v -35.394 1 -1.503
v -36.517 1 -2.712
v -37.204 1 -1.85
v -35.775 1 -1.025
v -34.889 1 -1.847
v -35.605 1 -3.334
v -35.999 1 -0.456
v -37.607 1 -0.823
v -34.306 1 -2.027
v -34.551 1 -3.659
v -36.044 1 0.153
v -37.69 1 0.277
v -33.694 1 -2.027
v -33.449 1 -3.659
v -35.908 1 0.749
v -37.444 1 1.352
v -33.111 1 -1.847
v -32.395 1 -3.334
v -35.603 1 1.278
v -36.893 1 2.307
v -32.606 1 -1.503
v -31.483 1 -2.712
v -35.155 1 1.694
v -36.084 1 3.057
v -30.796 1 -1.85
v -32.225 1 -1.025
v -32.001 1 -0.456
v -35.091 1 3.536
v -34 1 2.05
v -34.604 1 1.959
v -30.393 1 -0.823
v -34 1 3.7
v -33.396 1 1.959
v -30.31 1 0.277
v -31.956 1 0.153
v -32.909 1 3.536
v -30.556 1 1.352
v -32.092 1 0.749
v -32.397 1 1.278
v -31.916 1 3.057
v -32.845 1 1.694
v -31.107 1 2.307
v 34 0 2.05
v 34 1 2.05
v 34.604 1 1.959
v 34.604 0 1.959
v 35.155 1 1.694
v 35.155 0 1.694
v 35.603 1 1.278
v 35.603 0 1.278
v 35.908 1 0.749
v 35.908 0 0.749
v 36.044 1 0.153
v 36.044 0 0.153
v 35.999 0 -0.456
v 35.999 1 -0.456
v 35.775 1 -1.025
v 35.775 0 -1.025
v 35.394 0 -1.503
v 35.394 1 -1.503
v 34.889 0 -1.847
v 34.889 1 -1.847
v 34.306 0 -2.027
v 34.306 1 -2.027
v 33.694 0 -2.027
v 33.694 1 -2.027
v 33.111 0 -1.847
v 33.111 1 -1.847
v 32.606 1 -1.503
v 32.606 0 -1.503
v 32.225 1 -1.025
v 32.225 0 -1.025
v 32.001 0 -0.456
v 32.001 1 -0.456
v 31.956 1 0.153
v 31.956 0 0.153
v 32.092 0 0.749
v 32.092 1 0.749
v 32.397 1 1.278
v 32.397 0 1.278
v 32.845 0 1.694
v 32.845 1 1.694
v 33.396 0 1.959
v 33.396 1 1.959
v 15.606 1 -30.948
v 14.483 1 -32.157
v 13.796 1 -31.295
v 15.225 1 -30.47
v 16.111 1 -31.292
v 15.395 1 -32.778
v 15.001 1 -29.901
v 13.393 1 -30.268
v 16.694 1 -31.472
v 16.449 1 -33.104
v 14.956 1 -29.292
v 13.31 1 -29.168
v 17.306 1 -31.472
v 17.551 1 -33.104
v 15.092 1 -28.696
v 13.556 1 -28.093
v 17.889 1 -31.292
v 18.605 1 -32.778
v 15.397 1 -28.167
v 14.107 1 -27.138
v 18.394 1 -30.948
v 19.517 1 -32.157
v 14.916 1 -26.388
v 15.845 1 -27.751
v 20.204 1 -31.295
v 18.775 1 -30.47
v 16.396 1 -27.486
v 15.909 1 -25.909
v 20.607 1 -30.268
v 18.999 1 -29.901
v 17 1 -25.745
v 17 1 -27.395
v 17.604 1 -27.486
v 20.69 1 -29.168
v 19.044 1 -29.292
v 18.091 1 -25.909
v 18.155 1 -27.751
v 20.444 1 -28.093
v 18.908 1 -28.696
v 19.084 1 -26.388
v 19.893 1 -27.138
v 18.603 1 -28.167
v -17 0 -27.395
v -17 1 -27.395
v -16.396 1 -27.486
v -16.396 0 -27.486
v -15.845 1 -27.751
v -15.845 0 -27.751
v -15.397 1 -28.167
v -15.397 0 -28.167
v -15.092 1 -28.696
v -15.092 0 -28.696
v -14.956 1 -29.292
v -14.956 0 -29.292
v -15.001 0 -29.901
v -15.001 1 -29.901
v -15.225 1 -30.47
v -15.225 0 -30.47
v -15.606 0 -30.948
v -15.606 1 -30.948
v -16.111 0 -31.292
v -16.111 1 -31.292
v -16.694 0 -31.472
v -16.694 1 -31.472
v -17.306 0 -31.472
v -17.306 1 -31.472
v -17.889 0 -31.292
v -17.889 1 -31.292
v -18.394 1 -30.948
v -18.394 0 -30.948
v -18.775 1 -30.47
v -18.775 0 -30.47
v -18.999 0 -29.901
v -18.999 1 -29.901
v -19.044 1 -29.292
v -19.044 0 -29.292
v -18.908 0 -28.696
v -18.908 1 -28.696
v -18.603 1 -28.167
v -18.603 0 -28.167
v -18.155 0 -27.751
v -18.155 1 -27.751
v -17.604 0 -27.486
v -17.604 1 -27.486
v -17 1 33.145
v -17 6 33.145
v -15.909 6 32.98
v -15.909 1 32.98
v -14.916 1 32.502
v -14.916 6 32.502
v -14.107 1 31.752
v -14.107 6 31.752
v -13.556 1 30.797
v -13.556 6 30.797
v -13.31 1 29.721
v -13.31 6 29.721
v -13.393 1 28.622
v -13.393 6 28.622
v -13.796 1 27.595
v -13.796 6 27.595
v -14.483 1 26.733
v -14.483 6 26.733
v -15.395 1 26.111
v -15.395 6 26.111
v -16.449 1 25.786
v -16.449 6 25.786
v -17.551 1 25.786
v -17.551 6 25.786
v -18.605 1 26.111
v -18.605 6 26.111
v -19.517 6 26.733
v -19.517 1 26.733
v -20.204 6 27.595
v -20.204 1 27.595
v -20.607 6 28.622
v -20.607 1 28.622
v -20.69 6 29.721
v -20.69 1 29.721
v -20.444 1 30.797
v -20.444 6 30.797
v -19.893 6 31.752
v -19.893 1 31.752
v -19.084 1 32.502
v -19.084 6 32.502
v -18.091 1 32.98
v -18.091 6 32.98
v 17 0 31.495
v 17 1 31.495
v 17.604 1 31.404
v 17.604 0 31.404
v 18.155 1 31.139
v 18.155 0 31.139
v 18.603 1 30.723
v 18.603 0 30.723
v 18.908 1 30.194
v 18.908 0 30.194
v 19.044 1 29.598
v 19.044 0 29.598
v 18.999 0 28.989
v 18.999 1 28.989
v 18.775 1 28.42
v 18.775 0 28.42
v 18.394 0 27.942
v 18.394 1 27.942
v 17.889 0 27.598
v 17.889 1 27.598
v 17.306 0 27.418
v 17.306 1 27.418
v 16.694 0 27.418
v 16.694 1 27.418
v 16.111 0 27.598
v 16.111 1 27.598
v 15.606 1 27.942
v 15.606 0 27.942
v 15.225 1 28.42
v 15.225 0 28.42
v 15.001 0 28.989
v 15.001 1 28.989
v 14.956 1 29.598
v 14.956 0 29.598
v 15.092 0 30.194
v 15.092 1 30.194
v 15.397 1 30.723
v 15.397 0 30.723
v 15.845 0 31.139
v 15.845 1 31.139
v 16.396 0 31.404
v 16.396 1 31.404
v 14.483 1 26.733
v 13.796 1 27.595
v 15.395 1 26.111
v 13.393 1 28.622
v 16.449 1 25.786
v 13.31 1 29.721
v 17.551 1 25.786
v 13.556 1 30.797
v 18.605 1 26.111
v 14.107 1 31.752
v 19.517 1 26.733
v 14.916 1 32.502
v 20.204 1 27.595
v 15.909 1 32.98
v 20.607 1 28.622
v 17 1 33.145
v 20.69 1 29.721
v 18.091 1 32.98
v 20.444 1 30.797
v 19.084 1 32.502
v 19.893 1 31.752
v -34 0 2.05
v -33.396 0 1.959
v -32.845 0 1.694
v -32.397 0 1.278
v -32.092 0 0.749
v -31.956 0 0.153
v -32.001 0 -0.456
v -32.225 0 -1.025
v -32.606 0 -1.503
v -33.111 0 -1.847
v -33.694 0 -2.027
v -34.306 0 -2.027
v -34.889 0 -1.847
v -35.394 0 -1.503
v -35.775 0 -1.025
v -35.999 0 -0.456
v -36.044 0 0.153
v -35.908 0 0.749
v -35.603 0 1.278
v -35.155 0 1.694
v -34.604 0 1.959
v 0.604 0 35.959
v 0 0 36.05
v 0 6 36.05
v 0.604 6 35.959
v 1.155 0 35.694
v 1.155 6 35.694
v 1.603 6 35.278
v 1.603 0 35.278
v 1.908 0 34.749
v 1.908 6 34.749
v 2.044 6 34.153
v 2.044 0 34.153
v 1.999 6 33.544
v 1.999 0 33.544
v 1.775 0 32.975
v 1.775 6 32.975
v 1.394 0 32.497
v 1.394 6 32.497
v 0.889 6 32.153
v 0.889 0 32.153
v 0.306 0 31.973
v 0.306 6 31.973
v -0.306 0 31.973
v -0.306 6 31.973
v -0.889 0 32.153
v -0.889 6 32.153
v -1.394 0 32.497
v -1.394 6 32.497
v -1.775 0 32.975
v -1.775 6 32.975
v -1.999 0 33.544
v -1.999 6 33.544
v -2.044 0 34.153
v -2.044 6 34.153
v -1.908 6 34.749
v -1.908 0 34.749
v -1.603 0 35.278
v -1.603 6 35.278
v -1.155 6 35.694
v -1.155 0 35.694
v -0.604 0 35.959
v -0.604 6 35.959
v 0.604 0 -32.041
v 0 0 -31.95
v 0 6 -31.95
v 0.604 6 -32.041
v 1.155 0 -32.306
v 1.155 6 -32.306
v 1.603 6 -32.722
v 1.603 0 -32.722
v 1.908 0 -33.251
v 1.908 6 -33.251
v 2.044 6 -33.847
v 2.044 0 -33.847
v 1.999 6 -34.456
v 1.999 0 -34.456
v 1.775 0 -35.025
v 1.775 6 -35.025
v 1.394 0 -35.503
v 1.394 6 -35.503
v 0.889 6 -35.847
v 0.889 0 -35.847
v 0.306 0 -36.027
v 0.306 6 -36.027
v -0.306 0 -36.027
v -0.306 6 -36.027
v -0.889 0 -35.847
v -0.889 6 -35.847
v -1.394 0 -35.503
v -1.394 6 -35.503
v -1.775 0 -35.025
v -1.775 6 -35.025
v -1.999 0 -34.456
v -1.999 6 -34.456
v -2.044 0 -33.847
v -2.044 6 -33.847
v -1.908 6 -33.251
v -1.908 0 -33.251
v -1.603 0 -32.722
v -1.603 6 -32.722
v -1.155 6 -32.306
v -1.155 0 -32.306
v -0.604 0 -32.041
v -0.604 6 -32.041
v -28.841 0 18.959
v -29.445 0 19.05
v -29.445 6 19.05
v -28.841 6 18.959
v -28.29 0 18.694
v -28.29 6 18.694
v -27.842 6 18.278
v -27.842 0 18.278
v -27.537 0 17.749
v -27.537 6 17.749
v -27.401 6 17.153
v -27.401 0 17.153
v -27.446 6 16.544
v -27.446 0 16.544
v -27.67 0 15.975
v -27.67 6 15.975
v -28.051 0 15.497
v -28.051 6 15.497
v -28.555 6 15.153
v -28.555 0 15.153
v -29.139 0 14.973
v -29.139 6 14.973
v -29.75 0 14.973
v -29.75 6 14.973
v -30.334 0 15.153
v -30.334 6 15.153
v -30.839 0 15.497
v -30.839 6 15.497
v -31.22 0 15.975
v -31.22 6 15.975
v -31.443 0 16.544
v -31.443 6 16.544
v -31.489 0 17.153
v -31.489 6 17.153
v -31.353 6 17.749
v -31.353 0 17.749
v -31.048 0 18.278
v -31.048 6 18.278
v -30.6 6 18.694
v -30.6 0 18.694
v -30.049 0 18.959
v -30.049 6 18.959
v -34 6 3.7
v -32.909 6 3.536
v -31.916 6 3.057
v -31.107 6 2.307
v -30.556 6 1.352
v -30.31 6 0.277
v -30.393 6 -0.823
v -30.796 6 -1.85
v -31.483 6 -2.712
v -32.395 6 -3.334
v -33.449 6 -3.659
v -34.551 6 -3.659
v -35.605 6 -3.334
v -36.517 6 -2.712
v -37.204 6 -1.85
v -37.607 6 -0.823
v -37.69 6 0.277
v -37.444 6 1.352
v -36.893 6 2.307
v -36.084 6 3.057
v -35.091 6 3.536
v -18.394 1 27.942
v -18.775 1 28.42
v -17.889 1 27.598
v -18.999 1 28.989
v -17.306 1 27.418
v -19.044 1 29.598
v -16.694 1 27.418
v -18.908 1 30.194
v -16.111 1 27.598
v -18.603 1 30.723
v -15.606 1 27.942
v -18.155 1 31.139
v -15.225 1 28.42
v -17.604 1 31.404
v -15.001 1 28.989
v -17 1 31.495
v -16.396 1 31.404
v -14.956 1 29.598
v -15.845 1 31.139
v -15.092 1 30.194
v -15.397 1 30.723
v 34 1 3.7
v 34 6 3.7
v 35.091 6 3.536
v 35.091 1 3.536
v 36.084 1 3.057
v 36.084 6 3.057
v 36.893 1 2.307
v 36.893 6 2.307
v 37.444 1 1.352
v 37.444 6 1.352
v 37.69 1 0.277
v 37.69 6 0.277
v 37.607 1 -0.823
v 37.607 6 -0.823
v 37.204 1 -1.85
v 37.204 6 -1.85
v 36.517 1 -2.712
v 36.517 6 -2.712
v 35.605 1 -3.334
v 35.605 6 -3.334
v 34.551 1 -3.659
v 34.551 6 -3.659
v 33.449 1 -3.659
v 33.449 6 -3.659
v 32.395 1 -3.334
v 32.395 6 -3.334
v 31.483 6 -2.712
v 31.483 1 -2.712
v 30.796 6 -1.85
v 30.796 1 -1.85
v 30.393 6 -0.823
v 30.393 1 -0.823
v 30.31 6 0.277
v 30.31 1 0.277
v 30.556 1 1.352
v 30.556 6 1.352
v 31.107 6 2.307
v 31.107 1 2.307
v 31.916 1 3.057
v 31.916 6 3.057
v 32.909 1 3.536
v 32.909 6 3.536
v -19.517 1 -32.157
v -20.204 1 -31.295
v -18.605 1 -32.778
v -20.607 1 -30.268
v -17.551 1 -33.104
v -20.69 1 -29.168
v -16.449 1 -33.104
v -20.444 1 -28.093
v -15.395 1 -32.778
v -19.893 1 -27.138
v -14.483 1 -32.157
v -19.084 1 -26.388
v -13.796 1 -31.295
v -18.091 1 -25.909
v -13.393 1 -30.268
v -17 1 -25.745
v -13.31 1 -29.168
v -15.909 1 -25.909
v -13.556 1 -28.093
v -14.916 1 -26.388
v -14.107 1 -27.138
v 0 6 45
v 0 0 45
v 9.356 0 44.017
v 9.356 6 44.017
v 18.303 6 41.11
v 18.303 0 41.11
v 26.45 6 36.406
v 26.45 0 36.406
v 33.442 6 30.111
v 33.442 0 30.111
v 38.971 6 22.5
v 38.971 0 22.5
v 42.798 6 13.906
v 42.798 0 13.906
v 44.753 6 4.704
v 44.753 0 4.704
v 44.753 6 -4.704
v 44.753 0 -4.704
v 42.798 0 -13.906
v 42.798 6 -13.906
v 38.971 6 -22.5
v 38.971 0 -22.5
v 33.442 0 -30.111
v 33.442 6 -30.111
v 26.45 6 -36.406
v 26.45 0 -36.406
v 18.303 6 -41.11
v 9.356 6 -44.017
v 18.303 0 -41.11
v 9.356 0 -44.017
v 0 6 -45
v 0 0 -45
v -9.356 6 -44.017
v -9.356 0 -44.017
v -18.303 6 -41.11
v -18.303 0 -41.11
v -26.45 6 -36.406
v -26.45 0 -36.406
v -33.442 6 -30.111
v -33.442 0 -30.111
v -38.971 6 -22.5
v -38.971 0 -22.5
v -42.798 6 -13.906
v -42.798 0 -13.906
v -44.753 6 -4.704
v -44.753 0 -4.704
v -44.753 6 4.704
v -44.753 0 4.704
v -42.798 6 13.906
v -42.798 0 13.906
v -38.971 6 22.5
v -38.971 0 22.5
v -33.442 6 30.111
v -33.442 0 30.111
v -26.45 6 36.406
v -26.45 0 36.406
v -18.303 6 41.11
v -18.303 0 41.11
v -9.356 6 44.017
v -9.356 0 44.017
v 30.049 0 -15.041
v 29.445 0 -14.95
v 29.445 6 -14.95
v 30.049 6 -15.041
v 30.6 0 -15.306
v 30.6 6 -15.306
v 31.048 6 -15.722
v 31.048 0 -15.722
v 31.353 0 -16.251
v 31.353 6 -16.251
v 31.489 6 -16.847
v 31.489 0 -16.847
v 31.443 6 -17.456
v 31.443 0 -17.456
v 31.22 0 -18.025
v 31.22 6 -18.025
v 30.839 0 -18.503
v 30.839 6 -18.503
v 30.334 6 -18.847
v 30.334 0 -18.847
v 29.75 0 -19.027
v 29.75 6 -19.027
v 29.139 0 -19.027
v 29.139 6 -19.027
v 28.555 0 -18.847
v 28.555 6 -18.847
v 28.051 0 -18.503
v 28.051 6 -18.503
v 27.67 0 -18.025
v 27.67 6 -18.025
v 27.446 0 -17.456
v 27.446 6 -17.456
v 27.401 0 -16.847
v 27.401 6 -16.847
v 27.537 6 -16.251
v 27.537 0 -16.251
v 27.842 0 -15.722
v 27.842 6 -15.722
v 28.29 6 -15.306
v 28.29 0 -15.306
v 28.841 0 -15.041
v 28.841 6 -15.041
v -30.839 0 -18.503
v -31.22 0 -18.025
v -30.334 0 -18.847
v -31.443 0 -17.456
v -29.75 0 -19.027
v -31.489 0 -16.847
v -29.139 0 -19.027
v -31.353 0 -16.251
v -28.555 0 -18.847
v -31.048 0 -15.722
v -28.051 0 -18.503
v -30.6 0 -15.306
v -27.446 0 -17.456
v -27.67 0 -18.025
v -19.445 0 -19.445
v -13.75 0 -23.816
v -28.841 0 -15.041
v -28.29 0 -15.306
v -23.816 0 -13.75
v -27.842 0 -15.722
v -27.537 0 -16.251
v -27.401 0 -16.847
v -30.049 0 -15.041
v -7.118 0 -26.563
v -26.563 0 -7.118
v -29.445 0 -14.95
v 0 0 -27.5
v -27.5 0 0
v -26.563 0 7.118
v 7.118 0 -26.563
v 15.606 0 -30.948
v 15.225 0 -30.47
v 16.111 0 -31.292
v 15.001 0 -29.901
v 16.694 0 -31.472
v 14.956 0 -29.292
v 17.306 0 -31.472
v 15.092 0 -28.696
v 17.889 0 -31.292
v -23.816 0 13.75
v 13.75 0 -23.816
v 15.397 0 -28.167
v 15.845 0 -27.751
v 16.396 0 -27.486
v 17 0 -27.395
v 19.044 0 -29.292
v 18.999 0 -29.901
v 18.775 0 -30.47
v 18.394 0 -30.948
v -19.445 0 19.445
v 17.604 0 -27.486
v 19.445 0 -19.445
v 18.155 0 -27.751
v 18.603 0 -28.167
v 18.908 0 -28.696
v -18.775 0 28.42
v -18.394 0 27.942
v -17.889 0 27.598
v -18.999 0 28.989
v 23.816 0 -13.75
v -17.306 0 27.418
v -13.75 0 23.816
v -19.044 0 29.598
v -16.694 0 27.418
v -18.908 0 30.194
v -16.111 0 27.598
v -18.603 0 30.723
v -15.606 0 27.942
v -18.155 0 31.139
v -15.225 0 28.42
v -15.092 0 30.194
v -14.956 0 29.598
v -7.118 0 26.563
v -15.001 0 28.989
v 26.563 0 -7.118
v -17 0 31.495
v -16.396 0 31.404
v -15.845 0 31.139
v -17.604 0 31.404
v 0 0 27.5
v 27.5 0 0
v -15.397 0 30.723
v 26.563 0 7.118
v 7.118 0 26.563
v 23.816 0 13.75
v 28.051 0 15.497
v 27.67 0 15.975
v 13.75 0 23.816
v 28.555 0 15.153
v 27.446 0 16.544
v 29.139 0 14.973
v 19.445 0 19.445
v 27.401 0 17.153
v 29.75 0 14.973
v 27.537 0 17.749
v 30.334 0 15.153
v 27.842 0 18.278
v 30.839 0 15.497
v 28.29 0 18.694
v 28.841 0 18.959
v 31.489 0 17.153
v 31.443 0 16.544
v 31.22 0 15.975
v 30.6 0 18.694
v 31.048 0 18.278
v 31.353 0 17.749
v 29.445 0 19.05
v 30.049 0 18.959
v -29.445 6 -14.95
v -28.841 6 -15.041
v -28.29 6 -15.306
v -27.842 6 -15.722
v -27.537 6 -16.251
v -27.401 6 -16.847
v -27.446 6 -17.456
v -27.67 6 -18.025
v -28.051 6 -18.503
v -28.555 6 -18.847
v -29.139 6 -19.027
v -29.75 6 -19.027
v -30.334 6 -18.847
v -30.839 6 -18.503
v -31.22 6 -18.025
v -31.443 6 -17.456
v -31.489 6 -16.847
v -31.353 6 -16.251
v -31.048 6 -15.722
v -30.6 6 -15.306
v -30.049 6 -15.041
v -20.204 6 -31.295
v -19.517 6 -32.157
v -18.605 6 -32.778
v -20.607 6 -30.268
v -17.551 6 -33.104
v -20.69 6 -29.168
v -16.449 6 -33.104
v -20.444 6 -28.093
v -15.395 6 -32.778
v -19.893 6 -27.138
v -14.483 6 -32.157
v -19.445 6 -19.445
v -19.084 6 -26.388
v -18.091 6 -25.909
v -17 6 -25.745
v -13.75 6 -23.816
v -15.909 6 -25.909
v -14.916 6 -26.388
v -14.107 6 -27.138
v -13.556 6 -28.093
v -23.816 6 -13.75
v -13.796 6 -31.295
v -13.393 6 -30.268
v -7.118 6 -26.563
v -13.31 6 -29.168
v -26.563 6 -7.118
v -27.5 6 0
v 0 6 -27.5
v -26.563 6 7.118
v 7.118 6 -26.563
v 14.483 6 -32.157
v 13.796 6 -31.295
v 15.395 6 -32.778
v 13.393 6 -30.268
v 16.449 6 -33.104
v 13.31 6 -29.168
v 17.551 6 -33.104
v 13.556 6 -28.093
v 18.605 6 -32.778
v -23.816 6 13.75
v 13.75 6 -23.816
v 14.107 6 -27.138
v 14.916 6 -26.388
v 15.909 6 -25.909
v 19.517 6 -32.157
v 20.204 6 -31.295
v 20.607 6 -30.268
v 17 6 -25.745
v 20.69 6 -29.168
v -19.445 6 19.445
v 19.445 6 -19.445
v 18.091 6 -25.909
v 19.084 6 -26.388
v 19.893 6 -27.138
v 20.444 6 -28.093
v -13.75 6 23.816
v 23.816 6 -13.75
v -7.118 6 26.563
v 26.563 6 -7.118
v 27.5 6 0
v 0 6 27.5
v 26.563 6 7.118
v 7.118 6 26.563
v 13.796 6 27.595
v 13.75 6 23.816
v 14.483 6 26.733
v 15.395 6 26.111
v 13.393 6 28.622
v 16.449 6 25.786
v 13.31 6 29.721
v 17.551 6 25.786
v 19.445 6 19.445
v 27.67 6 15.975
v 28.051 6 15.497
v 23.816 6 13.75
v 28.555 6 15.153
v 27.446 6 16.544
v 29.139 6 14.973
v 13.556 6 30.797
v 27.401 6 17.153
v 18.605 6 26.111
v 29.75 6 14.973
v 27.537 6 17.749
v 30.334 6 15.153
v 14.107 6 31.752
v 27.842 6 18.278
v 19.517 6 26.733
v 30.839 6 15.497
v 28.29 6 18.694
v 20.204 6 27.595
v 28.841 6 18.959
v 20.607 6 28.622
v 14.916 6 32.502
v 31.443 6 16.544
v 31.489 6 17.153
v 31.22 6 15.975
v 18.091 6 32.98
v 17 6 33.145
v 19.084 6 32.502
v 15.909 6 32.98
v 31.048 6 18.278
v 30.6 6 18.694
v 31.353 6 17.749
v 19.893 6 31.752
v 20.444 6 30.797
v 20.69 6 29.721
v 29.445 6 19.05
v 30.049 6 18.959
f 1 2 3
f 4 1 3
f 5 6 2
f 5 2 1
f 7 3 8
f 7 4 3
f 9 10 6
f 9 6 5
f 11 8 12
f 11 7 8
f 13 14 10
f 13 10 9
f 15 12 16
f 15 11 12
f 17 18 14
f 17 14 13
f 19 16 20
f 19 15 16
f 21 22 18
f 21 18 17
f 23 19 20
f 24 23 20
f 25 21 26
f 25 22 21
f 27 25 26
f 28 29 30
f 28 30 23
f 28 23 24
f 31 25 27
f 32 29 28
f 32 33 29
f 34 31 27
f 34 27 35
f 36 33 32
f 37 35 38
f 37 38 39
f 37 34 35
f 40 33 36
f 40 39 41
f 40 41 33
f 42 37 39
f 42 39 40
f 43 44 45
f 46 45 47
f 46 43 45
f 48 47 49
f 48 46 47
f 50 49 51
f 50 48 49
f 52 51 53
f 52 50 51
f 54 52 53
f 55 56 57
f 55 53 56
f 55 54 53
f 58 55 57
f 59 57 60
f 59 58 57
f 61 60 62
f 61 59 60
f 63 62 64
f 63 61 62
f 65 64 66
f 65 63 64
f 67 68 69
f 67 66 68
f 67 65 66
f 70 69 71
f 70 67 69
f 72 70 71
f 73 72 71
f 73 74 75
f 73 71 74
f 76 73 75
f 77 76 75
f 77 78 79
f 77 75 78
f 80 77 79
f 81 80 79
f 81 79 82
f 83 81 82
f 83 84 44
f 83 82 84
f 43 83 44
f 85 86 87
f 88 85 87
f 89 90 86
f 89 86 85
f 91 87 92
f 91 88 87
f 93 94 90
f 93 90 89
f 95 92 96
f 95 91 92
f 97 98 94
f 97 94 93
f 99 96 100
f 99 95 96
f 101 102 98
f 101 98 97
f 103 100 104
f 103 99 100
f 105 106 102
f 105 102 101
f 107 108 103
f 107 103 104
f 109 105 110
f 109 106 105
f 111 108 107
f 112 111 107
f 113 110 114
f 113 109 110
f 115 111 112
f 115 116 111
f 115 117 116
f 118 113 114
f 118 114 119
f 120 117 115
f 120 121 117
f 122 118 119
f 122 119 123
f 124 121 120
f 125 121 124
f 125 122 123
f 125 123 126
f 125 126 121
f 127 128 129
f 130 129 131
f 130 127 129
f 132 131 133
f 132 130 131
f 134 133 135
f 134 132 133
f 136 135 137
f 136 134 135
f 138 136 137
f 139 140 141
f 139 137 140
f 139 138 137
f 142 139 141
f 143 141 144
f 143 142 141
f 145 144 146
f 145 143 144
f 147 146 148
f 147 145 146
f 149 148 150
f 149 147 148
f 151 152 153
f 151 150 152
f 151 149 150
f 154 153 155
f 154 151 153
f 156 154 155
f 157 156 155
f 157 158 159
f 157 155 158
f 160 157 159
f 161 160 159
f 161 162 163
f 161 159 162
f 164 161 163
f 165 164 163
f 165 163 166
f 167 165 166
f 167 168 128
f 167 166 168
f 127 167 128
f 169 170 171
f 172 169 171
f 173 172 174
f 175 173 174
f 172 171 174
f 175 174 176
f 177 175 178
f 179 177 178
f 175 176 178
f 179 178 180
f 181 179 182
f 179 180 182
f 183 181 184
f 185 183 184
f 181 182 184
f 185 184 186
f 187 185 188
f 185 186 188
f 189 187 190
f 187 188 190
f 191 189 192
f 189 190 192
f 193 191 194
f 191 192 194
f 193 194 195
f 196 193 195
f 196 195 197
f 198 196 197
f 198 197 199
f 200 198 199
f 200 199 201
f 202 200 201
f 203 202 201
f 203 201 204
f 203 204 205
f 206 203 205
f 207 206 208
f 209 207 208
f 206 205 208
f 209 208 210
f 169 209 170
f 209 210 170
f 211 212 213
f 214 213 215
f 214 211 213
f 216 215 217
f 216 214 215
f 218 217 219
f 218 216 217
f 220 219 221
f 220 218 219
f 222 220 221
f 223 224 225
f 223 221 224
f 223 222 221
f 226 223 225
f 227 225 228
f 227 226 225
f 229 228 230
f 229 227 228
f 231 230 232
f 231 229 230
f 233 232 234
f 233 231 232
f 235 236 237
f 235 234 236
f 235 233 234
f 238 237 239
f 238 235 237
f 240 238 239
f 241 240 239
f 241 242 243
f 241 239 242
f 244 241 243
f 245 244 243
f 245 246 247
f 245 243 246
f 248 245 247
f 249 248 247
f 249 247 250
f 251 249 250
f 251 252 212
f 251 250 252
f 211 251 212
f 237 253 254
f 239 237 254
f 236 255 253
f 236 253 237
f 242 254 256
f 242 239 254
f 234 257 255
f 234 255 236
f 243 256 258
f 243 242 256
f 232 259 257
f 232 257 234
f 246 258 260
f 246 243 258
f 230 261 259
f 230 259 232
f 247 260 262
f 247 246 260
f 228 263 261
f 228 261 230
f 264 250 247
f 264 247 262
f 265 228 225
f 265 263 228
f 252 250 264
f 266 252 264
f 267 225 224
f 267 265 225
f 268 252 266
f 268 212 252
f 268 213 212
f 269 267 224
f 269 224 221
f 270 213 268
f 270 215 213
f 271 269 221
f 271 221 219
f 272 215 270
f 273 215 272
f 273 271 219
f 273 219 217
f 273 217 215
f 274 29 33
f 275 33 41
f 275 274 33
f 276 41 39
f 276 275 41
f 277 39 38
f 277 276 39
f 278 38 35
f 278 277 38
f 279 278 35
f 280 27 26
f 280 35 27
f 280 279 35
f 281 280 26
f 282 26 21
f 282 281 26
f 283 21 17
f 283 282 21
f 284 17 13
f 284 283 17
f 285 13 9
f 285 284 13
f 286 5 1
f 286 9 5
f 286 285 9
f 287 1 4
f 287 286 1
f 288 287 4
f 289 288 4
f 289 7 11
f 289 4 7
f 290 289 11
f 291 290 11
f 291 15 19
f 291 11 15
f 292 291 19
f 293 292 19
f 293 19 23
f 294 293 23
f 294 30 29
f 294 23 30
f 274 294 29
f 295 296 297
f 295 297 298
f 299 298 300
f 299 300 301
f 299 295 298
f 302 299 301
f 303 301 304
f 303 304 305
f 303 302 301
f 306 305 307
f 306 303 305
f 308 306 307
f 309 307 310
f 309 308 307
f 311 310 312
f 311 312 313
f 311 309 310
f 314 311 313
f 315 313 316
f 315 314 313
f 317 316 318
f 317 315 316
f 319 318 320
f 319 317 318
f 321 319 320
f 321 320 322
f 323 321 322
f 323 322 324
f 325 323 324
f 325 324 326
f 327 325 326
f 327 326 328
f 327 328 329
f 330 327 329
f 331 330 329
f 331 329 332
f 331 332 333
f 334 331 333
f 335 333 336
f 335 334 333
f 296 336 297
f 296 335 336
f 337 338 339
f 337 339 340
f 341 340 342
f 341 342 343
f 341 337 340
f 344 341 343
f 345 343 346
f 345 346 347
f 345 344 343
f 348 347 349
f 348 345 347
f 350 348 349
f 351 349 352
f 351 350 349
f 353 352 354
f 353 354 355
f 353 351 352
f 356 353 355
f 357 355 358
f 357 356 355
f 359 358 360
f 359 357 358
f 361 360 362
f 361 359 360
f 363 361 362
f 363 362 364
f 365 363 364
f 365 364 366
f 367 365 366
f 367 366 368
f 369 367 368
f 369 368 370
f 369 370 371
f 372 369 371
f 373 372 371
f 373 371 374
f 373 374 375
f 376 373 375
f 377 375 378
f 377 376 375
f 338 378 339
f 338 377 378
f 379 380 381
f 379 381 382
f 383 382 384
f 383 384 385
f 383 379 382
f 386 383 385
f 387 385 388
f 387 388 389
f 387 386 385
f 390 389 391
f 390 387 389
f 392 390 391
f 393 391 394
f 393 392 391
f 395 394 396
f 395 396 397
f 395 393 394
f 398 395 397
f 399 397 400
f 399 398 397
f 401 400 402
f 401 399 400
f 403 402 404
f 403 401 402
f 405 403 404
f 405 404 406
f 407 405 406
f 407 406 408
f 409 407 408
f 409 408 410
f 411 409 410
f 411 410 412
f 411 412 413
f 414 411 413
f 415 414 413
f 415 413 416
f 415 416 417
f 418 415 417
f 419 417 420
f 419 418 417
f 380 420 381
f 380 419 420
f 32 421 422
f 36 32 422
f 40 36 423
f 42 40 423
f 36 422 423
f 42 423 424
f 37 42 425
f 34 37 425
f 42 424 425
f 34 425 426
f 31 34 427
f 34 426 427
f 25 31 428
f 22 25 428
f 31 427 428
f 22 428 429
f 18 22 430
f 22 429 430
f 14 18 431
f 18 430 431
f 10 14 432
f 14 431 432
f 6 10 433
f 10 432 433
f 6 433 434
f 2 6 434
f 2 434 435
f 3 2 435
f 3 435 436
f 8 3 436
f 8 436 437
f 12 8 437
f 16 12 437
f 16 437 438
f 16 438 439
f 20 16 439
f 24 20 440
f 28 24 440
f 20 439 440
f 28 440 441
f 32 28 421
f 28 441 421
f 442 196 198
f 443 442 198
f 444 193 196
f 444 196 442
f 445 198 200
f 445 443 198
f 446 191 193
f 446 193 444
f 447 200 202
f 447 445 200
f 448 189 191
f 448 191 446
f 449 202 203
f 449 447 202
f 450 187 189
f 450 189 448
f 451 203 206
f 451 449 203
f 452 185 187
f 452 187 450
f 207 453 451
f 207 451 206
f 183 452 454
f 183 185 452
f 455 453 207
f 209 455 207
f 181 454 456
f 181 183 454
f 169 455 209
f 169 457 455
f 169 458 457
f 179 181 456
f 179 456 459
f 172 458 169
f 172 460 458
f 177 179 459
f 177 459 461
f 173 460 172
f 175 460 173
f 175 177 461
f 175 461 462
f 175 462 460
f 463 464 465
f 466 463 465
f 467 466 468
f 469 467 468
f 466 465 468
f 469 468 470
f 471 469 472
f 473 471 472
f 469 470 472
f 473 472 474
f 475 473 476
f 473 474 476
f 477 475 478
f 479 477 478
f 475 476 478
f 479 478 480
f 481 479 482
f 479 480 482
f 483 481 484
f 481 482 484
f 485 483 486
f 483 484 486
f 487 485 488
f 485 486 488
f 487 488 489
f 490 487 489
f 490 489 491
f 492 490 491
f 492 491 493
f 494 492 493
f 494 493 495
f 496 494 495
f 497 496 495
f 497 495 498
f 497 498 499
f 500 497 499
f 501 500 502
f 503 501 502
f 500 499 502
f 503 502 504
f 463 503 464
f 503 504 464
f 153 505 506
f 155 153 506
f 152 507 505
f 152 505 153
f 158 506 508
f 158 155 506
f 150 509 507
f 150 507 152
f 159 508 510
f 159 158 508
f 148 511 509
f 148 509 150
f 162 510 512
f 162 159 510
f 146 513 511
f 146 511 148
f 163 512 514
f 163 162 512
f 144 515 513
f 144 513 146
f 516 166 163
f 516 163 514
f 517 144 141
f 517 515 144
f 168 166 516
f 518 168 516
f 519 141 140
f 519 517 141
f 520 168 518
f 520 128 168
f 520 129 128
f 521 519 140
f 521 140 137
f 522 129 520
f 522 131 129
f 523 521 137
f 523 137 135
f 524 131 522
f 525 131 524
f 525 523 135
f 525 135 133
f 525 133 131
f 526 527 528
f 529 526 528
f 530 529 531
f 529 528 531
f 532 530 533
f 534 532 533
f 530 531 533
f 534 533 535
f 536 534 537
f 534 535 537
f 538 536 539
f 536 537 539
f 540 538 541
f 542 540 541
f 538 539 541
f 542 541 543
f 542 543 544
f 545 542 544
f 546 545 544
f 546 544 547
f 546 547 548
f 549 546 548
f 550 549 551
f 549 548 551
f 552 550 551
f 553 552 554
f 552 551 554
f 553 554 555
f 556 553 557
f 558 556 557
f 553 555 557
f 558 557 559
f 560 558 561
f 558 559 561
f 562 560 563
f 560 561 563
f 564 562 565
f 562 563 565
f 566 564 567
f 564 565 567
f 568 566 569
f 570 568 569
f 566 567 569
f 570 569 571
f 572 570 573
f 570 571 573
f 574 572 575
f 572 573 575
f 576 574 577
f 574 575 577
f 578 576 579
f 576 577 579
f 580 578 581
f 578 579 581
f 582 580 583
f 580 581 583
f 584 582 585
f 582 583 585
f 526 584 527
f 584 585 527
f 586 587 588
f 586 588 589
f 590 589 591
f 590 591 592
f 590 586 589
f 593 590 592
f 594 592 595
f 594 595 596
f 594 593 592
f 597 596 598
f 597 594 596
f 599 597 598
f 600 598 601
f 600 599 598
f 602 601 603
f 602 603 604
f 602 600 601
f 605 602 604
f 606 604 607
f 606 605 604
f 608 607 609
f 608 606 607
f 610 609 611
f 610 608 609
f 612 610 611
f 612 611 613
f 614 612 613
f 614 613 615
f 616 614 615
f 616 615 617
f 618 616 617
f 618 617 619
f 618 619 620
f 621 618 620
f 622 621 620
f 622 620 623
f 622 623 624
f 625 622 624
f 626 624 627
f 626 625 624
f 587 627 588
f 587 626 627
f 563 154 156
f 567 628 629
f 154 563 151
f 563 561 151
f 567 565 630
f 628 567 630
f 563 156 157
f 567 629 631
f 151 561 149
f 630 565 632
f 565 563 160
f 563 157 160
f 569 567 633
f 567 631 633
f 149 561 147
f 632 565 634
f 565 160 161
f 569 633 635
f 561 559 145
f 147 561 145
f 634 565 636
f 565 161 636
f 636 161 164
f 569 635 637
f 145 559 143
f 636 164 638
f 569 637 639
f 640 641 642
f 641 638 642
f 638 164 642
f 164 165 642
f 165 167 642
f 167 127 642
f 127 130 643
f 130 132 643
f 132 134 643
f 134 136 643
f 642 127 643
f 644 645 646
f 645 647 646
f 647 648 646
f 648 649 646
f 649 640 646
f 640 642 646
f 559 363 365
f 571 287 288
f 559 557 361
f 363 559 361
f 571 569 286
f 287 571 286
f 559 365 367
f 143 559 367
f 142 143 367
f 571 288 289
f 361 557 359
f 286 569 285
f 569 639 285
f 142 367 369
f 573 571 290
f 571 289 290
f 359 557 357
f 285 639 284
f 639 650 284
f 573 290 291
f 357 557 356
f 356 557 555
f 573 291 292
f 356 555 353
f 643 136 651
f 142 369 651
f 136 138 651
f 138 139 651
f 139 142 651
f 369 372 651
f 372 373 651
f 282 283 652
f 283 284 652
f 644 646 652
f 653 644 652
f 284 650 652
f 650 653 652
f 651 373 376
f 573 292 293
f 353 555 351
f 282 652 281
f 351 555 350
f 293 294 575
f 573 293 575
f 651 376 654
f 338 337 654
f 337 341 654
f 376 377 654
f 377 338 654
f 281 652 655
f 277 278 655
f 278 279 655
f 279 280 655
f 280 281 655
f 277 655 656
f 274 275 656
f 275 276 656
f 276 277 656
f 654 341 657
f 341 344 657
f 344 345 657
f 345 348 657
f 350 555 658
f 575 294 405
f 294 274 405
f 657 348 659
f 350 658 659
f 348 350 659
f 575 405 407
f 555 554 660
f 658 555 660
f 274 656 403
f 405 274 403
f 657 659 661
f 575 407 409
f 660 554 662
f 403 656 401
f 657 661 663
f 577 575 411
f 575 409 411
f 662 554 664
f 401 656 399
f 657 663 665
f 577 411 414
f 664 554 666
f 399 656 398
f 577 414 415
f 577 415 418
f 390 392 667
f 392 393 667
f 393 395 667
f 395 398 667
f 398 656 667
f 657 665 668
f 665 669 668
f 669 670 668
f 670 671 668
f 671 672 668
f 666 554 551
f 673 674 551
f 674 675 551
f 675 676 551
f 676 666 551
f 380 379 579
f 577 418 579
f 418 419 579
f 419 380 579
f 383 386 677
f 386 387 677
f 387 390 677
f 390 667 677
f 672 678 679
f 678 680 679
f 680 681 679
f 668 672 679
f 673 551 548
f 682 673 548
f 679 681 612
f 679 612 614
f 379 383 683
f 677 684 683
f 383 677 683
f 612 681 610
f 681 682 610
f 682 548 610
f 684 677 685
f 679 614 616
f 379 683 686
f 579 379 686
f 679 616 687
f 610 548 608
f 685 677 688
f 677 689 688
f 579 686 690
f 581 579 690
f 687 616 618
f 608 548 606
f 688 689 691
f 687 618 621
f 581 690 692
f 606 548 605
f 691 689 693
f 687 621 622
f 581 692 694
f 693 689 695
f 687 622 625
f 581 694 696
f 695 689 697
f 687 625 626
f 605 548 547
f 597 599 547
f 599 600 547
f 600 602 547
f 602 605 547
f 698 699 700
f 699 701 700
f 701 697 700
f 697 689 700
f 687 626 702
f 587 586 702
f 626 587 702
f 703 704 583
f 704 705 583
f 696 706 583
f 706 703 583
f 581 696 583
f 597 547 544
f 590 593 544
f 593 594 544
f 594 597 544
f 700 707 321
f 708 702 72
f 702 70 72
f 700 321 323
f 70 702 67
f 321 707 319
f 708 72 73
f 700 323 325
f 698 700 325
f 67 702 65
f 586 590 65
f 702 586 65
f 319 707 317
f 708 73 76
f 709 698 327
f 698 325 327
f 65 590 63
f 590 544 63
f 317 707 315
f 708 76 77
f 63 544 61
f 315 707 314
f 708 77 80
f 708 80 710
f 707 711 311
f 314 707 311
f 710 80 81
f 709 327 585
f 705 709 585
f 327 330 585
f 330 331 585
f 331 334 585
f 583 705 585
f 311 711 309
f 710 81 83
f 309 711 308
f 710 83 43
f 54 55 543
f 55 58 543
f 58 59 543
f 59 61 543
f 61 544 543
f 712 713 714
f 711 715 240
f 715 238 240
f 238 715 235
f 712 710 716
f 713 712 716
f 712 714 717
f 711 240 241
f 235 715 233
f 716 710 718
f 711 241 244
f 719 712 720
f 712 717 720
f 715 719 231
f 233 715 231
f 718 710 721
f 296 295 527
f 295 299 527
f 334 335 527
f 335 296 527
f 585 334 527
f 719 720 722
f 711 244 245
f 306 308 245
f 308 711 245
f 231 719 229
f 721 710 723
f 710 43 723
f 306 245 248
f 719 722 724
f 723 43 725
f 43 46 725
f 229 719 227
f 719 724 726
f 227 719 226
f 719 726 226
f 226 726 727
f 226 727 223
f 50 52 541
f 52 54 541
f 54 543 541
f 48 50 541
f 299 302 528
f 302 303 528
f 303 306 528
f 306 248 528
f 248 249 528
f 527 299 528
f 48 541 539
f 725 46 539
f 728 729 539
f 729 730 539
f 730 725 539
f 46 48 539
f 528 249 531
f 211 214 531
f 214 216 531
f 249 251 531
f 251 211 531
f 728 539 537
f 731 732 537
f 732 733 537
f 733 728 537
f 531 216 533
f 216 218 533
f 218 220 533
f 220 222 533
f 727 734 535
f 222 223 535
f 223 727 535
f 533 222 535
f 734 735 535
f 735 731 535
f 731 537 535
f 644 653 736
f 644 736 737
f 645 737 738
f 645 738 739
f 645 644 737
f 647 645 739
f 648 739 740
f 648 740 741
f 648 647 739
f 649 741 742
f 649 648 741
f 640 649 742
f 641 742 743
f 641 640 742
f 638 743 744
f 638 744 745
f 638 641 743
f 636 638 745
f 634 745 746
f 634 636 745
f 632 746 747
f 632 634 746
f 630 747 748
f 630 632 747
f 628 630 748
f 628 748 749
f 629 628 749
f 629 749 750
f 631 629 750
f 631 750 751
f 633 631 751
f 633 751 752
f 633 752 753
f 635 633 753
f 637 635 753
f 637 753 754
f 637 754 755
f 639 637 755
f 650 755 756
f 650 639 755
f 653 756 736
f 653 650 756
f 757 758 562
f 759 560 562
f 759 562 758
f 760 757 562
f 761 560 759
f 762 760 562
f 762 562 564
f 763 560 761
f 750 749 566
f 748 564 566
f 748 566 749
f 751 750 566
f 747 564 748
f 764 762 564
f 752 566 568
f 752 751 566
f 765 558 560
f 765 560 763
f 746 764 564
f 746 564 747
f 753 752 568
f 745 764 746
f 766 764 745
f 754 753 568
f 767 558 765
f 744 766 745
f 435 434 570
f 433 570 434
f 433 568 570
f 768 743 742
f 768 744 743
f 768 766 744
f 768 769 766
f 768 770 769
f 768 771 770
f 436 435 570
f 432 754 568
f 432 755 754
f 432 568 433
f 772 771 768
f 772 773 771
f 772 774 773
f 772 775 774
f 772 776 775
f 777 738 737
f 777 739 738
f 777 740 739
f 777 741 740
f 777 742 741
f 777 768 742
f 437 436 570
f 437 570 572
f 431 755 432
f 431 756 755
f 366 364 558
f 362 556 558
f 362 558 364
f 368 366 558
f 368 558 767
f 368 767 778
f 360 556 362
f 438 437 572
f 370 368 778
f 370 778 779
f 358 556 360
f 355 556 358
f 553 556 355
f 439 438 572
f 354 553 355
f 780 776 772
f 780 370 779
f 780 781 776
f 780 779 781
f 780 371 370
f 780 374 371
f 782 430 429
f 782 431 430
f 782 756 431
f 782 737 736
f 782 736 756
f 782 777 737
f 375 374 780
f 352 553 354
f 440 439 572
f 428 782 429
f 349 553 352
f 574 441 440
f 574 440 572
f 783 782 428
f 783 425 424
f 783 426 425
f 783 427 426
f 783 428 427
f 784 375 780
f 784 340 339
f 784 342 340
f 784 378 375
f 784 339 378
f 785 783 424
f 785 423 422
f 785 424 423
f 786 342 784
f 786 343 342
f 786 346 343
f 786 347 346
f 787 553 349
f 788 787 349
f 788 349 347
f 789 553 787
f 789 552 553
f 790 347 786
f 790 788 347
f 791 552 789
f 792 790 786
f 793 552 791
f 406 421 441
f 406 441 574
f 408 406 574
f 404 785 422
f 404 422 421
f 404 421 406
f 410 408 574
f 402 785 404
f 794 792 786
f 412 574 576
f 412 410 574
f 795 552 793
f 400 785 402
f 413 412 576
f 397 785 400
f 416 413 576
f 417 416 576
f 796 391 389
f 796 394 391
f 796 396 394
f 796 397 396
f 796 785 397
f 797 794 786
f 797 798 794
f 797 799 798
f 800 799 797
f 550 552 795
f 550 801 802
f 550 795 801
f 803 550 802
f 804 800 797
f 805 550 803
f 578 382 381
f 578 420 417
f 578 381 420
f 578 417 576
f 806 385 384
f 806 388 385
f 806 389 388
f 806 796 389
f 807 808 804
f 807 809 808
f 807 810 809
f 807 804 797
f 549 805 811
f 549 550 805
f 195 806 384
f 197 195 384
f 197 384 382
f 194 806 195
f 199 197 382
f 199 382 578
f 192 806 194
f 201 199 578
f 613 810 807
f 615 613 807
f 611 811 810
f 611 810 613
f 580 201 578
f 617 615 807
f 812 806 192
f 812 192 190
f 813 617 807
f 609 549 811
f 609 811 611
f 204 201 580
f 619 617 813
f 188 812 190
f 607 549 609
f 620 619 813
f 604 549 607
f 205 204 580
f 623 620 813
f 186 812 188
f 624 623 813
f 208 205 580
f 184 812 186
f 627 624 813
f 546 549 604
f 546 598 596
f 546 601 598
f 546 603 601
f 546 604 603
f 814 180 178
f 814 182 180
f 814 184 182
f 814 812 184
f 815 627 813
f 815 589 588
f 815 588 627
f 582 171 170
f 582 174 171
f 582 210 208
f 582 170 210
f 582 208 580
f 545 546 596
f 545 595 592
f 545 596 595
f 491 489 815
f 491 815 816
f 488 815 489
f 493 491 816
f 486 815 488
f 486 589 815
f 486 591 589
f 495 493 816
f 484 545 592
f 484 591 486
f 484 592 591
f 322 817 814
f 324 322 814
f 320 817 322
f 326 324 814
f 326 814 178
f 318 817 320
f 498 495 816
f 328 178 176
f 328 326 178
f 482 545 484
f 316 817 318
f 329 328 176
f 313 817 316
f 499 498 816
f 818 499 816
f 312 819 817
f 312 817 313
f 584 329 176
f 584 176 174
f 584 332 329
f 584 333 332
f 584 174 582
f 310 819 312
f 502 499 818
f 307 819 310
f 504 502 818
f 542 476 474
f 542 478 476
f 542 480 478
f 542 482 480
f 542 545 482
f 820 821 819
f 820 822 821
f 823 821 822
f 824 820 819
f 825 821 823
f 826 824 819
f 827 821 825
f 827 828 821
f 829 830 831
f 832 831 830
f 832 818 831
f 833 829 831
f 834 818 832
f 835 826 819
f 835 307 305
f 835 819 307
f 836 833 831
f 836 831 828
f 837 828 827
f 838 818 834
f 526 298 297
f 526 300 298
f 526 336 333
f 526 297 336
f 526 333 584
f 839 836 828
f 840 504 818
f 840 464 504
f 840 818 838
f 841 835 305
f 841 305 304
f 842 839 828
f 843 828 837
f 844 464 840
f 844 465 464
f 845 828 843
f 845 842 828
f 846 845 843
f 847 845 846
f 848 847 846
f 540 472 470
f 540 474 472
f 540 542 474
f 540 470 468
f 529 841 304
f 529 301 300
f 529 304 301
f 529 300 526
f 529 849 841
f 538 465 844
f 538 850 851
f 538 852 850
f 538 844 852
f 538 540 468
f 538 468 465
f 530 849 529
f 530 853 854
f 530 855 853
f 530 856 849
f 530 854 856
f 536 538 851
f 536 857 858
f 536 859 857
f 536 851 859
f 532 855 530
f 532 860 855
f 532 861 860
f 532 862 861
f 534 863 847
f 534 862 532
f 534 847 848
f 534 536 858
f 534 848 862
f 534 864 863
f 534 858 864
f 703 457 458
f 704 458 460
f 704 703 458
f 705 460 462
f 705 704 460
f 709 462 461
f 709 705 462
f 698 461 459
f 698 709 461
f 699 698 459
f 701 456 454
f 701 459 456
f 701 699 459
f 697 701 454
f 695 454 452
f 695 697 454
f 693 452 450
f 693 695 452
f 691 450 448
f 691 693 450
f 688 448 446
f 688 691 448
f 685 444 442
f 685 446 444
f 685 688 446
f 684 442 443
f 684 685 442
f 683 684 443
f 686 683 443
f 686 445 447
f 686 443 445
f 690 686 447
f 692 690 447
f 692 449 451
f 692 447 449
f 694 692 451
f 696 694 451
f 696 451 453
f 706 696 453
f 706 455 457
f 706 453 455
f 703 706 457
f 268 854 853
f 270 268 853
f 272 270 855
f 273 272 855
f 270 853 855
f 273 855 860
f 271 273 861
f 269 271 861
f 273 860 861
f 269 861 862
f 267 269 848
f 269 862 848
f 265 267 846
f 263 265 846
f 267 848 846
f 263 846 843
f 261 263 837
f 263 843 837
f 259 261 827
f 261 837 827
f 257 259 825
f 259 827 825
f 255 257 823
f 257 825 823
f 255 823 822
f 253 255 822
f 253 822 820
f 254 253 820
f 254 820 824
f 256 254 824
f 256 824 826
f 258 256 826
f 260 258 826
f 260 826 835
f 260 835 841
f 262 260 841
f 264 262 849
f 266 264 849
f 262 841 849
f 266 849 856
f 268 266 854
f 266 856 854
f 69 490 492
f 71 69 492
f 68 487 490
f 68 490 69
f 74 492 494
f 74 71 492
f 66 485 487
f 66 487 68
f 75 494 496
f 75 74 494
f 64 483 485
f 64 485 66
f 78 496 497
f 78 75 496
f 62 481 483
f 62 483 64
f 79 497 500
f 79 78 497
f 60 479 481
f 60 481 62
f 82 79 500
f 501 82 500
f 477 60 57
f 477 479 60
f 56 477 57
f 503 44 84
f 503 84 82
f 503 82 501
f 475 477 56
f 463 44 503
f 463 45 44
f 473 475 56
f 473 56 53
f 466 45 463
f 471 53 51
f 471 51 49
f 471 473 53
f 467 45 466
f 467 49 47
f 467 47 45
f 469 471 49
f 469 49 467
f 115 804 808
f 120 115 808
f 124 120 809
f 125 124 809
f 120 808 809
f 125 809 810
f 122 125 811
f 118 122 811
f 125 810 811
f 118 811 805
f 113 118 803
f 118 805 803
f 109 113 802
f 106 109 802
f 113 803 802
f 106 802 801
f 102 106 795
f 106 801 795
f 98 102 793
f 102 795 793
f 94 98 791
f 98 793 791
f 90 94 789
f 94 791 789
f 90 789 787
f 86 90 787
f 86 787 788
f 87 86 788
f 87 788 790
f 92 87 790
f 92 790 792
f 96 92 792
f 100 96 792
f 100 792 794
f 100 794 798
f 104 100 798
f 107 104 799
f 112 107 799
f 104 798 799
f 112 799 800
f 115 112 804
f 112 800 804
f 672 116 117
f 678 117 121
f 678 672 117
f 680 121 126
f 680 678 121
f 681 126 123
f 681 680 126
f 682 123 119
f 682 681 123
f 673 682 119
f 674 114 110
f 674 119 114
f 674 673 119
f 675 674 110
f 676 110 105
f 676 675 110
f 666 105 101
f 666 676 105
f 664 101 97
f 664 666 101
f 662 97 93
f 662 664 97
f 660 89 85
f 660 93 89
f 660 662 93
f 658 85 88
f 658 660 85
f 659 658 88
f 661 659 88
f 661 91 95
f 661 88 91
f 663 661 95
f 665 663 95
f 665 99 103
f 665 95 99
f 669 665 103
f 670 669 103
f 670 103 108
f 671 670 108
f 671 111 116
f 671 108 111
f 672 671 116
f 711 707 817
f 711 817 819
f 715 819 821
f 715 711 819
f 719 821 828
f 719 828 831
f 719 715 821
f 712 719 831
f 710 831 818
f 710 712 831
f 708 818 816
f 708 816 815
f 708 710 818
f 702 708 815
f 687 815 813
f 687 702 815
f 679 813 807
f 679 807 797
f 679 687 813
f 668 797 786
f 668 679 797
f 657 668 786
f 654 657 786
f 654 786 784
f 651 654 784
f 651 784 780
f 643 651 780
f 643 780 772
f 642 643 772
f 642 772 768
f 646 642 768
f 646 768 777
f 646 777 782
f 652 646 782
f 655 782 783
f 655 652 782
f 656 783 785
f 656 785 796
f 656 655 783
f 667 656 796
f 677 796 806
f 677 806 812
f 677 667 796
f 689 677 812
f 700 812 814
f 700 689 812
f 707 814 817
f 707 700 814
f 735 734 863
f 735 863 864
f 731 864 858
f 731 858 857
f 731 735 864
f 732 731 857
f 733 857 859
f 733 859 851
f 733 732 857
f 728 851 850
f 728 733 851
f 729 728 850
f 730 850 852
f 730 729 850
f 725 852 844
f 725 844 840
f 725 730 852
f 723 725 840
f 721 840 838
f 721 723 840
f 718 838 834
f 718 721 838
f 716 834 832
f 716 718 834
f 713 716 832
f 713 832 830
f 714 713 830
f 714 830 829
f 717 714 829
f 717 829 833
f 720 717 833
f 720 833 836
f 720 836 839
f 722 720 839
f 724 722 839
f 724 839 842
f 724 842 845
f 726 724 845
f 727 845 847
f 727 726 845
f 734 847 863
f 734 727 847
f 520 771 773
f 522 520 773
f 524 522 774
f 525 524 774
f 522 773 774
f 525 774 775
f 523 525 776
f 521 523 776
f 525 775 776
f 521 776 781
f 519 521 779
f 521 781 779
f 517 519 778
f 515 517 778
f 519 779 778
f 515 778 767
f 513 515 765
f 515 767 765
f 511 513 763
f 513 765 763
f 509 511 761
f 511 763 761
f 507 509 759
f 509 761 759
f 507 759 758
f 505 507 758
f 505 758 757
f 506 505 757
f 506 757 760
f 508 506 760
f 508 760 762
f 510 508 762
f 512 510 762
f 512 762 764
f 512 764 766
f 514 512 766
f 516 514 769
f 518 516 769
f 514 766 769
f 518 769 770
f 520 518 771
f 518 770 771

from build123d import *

# Parameters (mm, degrees)
SKETCH_1_R          = 45
SKETCH_1_R_2        = 2.05
SKETCH_1_R_3        = 27.5
EXTRUDE_1_DEPTH     = 6
SKETCH_2_R          = 3.7
CUT_EXTRUDE_1_DEPTH = 5


with BuildPart() as part:
    # 草图1 → 凸台-拉伸1 (new body)
    with BuildSketch(Plane(origin=(0, 0, 0), x_dir=(1, 0, 0), z_dir=(0, 1, 0))):
        with Locations(Location((0, 0, 0), (0, 0, 270))):
            Circle(SKETCH_1_R)
        with Locations(Location((34, 0, 0), (0, 0, 270))):
            Circle(SKETCH_1_R_2, mode=Mode.SUBTRACT)
        with Locations(Location((29.444863729, -17, 0), (0, 0, 270))):
            Circle(SKETCH_1_R_2, mode=Mode.SUBTRACT)
        with Locations(Location((17, -29.444863729, 0), (0, 0, 270))):
            Circle(SKETCH_1_R_2, mode=Mode.SUBTRACT)
        with Locations(Location((0, -34, 0), (0, 0, 270))):
            Circle(SKETCH_1_R_2, mode=Mode.SUBTRACT)
        with Locations(Location((-17, -29.444863729, 0), (0, 0, 270))):
            Circle(SKETCH_1_R_2, mode=Mode.SUBTRACT)
        with Locations(Location((-29.444863729, -17, 0), (0, 0, 270))):
            Circle(SKETCH_1_R_2, mode=Mode.SUBTRACT)
        with Locations(Location((-34, 0, 0), (0, 0, 270))):
            Circle(SKETCH_1_R_2, mode=Mode.SUBTRACT)
        with Locations(Location((-29.444863729, 17, 0), (0, 0, 270))):
            Circle(SKETCH_1_R_2, mode=Mode.SUBTRACT)
        with Locations(Location((-17, 29.444863729, 0), (0, 0, 270))):
            Circle(SKETCH_1_R_2, mode=Mode.SUBTRACT)
        with Locations(Location((0, 34, 0), (0, 0, 270))):
            Circle(SKETCH_1_R_2, mode=Mode.SUBTRACT)
        with Locations(Location((17, 29.444863729, 0), (0, 0, 270))):
            Circle(SKETCH_1_R_2, mode=Mode.SUBTRACT)
        with Locations(Location((29.444863729, 17, 0), (0, 0, 270))):
            Circle(SKETCH_1_R_2, mode=Mode.SUBTRACT)
        with Locations(Location((0, 0, 0), (0, 0, 270))):
            Circle(SKETCH_1_R_3, mode=Mode.SUBTRACT)
    extrude(amount=EXTRUDE_1_DEPTH)

    # 草图2 → 切除-拉伸1 (cut)
    with BuildSketch(Plane(origin=(0, 6, 0), x_dir=(1, 0, 0), z_dir=(0, 1, 0))):
        with Locations(Location((34, 0, 0), (0, 0, 270))):
            Circle(SKETCH_2_R)
        with Locations(Location((17, -29.444863729, 0), (0, 0, 270))):
            Circle(SKETCH_2_R)
        with Locations(Location((-17, -29.444863729, 0), (0, 0, 270))):
            Circle(SKETCH_2_R)
        with Locations(Location((-34, 0, 0), (0, 0, 270))):
            Circle(SKETCH_2_R)
        with Locations(Location((-17, 29.444863729, 0), (0, 0, 270))):
            Circle(SKETCH_2_R)
        with Locations(Location((17, 29.444863729, 0), (0, 0, 270))):
            Circle(SKETCH_2_R)
    extrude(amount=-CUT_EXTRUDE_1_DEPTH, mode=Mode.SUBTRACT)


solid = part.part
